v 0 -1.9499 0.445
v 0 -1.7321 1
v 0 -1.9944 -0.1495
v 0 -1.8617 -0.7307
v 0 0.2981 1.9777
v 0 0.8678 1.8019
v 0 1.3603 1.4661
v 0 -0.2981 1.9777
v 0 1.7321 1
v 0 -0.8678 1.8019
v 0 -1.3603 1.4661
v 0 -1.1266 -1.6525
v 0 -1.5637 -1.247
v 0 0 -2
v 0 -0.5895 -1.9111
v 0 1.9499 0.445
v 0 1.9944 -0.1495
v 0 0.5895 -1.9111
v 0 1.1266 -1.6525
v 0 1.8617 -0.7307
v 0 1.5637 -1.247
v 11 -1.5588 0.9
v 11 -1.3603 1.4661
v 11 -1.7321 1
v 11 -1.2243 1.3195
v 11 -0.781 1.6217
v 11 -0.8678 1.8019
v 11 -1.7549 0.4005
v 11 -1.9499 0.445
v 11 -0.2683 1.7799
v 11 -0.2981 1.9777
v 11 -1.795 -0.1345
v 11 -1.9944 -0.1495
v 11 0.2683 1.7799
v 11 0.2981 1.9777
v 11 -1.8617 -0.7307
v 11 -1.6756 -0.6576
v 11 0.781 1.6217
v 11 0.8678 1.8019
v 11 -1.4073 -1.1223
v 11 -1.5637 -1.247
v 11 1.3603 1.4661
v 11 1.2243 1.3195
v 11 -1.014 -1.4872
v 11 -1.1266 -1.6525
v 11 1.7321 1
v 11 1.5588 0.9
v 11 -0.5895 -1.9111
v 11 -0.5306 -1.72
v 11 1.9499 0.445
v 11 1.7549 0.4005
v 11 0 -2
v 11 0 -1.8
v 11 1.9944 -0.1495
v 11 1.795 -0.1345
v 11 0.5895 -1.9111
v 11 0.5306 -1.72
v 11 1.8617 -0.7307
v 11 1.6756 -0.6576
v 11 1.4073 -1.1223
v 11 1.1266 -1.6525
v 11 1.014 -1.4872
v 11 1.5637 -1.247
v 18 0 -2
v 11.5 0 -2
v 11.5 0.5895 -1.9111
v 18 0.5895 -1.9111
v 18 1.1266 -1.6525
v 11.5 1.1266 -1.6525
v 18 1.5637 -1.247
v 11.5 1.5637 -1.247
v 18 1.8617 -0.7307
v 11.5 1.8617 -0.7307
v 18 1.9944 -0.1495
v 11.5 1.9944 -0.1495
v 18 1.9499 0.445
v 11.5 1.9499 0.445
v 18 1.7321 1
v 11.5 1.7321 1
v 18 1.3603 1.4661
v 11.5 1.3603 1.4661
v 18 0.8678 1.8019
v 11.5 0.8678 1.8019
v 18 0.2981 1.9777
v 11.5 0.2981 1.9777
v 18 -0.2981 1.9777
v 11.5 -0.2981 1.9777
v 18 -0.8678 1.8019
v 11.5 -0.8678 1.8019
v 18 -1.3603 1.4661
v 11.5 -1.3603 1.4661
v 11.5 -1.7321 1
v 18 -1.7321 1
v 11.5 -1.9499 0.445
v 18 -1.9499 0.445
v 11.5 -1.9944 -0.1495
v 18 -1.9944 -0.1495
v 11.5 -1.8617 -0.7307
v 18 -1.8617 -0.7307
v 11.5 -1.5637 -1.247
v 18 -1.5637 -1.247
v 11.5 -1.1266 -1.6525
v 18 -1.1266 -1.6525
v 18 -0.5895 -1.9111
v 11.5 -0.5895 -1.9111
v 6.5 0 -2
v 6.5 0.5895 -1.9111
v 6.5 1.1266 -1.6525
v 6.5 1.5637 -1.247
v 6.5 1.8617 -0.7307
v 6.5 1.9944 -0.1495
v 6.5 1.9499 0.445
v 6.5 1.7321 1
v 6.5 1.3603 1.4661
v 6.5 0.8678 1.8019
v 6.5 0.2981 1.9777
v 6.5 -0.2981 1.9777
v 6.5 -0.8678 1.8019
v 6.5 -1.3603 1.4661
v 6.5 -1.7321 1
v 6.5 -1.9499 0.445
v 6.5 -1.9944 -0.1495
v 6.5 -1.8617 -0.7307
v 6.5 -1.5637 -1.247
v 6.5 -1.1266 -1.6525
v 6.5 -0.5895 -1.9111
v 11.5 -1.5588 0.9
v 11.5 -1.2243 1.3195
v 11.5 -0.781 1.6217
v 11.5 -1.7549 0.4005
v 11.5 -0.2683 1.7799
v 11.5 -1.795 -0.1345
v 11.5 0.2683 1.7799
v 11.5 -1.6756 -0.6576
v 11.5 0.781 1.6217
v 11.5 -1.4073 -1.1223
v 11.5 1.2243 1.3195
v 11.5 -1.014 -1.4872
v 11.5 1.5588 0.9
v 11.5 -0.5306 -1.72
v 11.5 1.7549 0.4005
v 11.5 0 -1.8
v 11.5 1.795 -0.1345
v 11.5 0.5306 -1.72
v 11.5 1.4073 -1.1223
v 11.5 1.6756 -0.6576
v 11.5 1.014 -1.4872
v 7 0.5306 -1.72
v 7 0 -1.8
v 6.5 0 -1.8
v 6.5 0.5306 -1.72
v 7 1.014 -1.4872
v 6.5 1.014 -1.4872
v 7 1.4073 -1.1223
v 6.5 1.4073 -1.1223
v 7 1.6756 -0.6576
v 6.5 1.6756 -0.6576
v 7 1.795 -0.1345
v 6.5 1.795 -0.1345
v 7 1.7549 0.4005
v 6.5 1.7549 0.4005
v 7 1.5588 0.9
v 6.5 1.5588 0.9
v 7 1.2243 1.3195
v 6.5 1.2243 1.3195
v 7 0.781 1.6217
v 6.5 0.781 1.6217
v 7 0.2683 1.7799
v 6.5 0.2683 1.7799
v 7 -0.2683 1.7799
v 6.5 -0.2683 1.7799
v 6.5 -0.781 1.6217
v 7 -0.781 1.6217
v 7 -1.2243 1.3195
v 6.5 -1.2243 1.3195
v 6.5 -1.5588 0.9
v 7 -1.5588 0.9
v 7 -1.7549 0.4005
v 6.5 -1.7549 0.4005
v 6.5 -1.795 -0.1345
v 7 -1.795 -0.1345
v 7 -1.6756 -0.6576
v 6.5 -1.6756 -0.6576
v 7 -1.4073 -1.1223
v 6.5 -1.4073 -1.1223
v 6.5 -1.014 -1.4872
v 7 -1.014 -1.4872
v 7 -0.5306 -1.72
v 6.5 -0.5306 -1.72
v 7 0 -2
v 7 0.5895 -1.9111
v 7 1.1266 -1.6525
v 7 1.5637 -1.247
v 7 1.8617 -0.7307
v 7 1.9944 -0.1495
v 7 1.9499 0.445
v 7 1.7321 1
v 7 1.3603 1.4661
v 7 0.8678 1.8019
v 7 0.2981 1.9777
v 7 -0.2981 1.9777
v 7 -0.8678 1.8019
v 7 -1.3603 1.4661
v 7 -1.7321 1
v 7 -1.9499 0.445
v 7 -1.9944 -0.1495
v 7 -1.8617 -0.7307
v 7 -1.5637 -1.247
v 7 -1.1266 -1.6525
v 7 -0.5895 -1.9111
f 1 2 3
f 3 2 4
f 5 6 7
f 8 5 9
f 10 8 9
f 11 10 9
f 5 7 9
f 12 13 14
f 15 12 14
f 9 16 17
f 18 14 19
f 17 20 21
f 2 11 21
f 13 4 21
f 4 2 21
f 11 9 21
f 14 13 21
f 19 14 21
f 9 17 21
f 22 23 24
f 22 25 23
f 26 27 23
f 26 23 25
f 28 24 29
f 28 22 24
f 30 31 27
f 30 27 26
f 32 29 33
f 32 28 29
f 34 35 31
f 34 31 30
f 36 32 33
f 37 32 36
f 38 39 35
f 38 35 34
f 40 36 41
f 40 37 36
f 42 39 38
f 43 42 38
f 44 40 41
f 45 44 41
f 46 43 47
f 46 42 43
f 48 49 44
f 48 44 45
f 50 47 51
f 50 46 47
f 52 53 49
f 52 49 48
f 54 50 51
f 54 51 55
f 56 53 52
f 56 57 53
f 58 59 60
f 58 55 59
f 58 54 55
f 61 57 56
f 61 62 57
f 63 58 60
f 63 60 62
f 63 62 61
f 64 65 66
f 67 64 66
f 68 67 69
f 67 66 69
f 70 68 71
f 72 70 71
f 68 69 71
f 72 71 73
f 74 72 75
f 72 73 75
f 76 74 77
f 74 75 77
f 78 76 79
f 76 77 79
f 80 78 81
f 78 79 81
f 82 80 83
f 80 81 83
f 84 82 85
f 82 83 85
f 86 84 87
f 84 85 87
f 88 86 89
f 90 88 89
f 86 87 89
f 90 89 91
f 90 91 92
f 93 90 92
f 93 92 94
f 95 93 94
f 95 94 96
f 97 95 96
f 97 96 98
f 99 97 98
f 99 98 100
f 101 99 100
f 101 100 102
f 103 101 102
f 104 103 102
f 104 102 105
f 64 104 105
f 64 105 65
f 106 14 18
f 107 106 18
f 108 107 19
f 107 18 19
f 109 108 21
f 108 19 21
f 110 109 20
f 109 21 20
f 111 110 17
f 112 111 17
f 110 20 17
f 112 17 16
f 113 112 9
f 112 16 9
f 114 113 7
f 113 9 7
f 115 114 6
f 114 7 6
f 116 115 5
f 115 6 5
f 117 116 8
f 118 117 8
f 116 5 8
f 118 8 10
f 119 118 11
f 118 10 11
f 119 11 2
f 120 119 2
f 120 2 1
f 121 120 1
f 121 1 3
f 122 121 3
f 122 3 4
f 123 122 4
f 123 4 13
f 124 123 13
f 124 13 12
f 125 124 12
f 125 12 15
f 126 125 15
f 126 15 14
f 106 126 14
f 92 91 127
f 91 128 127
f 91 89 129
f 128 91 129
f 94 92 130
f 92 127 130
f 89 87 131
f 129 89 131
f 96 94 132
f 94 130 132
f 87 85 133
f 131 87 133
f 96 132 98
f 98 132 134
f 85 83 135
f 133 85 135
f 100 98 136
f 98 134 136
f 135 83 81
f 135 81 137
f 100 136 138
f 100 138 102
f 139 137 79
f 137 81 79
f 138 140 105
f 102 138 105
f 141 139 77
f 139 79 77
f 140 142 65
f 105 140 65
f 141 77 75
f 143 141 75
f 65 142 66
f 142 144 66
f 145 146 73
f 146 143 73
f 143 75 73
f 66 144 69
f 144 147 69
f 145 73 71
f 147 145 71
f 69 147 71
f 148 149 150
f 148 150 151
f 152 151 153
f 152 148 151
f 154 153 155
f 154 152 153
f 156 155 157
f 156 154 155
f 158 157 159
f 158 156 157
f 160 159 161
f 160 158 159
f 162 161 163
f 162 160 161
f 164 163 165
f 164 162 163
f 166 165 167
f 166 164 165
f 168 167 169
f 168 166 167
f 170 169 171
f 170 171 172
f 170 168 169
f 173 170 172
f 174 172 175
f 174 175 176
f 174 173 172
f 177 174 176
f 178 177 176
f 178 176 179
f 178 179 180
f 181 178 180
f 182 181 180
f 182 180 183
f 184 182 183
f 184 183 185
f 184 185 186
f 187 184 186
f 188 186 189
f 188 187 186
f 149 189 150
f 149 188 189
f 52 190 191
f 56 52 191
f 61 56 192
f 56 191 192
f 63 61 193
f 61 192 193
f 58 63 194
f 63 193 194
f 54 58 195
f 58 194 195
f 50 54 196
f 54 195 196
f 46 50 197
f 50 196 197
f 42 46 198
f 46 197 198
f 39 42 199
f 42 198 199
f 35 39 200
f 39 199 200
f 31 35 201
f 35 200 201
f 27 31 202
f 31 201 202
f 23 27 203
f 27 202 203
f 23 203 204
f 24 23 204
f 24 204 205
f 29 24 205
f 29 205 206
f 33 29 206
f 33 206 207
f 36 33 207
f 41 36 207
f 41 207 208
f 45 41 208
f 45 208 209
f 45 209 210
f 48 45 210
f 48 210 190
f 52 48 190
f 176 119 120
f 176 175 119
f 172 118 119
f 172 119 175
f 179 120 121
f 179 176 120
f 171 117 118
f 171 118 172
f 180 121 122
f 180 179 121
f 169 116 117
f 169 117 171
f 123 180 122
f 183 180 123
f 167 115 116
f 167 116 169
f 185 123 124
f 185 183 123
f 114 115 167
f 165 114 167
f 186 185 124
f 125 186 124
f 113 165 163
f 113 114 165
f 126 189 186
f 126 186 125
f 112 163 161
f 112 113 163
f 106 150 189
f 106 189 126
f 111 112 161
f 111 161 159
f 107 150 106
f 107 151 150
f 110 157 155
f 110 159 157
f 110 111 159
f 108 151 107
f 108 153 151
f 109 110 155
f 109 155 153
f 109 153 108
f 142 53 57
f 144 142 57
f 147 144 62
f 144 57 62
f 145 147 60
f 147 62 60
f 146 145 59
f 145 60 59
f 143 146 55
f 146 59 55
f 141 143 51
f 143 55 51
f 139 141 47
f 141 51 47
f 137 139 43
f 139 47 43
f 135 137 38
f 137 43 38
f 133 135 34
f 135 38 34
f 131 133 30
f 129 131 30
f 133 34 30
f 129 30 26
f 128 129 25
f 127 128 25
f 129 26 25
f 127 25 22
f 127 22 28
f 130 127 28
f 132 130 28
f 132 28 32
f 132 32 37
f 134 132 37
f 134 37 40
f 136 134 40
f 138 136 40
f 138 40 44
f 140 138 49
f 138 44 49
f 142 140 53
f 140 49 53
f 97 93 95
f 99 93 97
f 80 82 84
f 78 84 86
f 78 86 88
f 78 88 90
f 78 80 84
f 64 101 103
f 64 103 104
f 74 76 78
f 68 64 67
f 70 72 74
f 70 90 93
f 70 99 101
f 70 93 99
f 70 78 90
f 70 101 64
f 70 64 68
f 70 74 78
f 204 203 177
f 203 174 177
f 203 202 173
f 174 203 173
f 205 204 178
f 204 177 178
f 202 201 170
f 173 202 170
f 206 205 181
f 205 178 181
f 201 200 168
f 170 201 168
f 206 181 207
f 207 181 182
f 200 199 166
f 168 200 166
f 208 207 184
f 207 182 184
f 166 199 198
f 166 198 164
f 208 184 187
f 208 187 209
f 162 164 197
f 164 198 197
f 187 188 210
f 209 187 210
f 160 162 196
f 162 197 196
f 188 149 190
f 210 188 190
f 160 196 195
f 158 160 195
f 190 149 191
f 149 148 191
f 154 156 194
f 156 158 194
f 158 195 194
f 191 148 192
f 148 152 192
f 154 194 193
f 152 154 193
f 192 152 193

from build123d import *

# Parameters (mm, degrees)
SKETCH_1_R          = 2
EXTRUDE_1_DEPTH     = 18
CUT_EXTRUDE_START   = -7
SKETCH_2_R          = 2
SKETCH_2_R_2        = 1.8
CUT_EXTRUDE_1_DEPTH = 0.5


with BuildPart() as part:
    # 草图1 → 凸台-拉伸1 (new body)
    with BuildSketch(Plane(origin=(0, 0, 0), x_dir=(0, 0, -1), z_dir=(1, 0, 0))):
        Circle(SKETCH_1_R)
    extrude(amount=EXTRUDE_1_DEPTH)

    # 草图2 → 切除-拉伸1 (cut)
    with BuildSketch(Plane(origin=(18, 0, 0), x_dir=(0, 0, -1), z_dir=(1, 0, 0)).offset(CUT_EXTRUDE_START)):
        Circle(SKETCH_2_R)
        Circle(SKETCH_2_R_2, mode=Mode.SUBTRACT)
    cut_extrude_1 = extrude(amount=CUT_EXTRUDE_1_DEPTH, mode=Mode.SUBTRACT)

    # 镜向1: 切除-拉伸1 across plane
    add(cut_extrude_1.mirror(Plane(origin=(9, 0, 0), x_dir=(0, 0, 1), z_dir=(1, 0, 0))), mode=Mode.SUBTRACT)


solid = part.part
